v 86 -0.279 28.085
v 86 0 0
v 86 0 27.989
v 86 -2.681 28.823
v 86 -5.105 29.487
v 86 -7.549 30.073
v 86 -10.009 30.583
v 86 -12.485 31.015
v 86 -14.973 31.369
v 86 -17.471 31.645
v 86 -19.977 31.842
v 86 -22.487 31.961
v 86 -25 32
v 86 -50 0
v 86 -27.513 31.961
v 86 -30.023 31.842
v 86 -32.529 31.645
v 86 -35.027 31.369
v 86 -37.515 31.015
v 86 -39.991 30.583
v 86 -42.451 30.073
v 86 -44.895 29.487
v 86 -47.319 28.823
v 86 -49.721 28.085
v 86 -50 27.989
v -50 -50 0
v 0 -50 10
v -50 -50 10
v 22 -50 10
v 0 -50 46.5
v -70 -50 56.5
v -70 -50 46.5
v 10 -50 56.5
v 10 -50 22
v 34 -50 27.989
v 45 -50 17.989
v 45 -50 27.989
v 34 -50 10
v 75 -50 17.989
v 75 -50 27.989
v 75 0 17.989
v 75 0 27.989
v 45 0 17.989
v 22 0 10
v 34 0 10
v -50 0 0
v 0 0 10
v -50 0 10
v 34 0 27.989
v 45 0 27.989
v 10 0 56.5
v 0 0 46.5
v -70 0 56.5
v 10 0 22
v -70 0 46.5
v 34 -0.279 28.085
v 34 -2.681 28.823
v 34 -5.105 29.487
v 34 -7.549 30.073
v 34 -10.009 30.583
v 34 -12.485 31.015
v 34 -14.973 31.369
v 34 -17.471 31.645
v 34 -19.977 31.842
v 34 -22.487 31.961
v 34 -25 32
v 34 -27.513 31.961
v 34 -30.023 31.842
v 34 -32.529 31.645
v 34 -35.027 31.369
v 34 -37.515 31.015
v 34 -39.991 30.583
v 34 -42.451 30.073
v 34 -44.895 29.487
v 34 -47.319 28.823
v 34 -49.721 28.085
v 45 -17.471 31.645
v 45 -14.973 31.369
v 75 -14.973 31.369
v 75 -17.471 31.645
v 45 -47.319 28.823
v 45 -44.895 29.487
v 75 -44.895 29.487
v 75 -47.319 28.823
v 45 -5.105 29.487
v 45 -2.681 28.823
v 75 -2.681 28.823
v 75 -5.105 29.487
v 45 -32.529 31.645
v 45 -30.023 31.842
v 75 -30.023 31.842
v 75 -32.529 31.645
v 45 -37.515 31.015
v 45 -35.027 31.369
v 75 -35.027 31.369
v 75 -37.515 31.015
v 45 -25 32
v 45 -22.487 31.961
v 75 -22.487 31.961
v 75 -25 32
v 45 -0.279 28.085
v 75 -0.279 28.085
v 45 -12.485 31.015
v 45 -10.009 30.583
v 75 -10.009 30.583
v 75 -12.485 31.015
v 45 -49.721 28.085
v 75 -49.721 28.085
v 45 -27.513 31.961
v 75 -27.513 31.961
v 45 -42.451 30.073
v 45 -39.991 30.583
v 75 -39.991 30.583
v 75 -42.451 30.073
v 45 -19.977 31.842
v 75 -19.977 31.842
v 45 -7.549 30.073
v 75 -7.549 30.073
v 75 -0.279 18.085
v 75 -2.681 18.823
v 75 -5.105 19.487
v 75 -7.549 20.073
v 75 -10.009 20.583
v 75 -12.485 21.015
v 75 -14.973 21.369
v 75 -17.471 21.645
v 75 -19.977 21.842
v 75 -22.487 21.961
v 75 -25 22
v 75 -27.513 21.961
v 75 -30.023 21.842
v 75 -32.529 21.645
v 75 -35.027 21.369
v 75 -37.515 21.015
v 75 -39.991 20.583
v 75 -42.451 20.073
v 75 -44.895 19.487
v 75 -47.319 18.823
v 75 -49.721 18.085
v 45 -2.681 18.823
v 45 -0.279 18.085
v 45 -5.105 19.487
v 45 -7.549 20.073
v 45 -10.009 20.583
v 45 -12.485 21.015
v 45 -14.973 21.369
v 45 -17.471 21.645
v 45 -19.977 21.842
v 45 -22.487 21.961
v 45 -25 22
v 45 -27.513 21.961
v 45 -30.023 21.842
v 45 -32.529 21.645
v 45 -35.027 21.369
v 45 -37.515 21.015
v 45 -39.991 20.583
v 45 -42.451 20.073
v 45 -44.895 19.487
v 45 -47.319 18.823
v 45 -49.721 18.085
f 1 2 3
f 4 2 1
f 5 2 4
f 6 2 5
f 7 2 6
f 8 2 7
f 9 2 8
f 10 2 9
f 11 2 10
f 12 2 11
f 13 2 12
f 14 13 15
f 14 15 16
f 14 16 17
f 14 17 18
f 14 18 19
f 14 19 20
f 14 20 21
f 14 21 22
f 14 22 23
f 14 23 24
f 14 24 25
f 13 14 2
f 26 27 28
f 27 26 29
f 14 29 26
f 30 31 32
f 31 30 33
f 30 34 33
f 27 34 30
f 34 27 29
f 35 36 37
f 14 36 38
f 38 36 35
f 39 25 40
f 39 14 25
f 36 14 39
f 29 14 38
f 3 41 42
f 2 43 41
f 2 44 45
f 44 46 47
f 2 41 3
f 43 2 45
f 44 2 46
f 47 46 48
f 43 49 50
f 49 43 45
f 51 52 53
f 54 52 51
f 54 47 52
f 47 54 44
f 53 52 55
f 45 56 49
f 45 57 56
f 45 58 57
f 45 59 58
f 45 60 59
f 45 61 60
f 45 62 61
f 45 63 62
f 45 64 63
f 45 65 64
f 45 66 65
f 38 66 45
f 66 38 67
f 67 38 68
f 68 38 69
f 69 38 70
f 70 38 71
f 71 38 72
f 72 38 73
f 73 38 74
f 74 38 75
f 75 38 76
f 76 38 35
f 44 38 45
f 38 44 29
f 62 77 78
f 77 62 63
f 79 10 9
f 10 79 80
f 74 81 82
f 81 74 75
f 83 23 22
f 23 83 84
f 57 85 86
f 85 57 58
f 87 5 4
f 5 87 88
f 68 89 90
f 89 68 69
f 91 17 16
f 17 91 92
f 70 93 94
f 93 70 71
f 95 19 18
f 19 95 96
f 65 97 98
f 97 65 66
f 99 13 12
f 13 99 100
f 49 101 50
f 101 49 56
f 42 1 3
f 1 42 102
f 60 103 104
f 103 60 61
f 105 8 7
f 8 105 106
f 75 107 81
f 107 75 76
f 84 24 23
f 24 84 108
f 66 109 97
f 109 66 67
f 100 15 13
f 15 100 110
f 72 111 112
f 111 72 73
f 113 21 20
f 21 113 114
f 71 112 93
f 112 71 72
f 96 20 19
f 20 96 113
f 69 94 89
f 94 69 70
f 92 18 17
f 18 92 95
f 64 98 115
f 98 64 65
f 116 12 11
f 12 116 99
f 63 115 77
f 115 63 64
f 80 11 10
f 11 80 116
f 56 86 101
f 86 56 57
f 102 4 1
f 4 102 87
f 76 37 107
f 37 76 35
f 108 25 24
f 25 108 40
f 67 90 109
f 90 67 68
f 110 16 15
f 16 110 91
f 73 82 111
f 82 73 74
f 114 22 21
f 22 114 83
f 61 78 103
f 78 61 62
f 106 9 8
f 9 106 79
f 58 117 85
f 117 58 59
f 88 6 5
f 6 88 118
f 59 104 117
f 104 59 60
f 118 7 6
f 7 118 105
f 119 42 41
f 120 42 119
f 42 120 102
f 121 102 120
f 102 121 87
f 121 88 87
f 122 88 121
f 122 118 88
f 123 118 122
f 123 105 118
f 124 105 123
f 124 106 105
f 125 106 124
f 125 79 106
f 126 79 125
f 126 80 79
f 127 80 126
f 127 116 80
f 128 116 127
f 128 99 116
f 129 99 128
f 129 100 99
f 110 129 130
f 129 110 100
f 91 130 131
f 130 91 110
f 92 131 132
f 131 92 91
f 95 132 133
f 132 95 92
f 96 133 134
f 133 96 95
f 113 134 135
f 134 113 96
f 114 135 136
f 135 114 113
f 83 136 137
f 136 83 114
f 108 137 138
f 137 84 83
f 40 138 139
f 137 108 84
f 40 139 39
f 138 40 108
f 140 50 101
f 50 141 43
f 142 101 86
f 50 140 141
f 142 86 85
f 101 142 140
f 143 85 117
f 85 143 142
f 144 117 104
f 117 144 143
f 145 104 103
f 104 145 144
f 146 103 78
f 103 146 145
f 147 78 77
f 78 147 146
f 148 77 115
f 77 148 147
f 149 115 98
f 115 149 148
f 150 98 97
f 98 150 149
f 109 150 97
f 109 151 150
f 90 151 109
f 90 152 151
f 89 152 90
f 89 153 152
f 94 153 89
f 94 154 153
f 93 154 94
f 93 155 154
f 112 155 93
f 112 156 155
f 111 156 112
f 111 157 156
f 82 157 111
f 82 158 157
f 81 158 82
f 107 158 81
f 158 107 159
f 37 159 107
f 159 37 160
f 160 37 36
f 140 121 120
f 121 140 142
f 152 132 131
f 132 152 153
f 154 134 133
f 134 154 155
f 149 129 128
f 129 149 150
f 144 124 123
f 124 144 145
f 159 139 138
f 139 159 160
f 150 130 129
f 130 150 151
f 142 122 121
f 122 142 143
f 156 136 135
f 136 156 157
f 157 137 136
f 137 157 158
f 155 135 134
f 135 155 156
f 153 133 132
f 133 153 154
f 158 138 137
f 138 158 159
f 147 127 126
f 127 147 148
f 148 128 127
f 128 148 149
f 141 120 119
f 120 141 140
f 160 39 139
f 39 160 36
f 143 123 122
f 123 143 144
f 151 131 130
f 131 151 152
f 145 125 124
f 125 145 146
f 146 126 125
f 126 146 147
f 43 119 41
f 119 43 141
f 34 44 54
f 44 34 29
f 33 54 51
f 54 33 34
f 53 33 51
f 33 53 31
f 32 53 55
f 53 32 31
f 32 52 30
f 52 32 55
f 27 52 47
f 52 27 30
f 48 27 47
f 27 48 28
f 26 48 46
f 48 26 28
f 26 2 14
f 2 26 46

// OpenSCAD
// file: airpods-max-desk-hook.scad
// airpods-max-desk-hook: desk-edge hanger for AirPods Max (384.8 g)
//
// Hooks over a 35mm desktop. Two contoured rails carry the metal headband arms
// so the knit mesh canopy never takes any load - mesh sag is the known failure
// mode on these.
//
// Print it as modelled, lying on its side: the whole C-profile is a vertical
// extrusion, so nothing overhangs and no supports are needed. What reads as
// "up" in use is +Y here; Z is the width along the desk edge.

/* ---- desk ---- */
desk_t       = 35;    // measured desktop thickness
desk_clear   = 1.5;   // slip fit over the edge
top_arm      = 70;    // reach back across the desk top
bot_arm      = 50;    // reach back underneath

/* ---- structure ---- */
arm_t        = 10;    // arm thickness
web_t        = 10;    // web thickness at the desk edge
hook_w       = 50;    // width along the desk edge (= print height)
gusset       = 12;    // 45 deg fillet at the cradle root

/* ---- saddle ---- */
// The hook passes UNDER the headband, so it meets the arch's inner surface:
// the saddle has to be convex for the arch to nest over it. A concave trough
// would touch at a single point and dig in.
cradle_out   = 60;    // saddle centre, measured out from the desk face
cradle_w     = 52;    // total width across both rails
saddle_r     = 80;    // convex radius, matched to the headband arch
saddle_top   = 32;    // height of the saddle crown
block_h      = 34;    // blank the saddle is carved from
relief_w     = 30;    // mesh clearance channel between the rails
relief_d     = 10;    // the knit canopy sags below the metal frame - clear it

eps = 0.01;

slot_h    = desk_t + desk_clear;
top_y0    = arm_t + slot_h;        // underside of the top arm
top_y1    = top_y0 + arm_t;
cradle_x0 = cradle_out - cradle_w / 2;
cradle_x1 = cradle_out + cradle_w / 2;
cz        = hook_w / 2;            // cradle centred across the width

// C-hook and cradle arm, traced as one closed outline.
profile = [
    [-bot_arm,        0],
    [cradle_x1,       0],
    [cradle_x1,       arm_t],
    [web_t + gusset,  arm_t],      // 45 deg gusset into the web
    [web_t,           arm_t + gusset],
    [web_t,           top_y1],
    [-top_arm,        top_y1],
    [-top_arm,        top_y0],
    [0,               top_y0],     // underside of the top arm
    [0,               arm_t],      // back of the desk slot
    [-bot_arm,        arm_t],
];

// A cylinder laid along X: its circular section sits in the YZ plane, which is
// exactly the plane the headband arch curves in.
module arch_cutter(r, cy, x0, len) {
    translate([x0, cy, cz])
        rotate([0, 90, 0])
            cylinder(h = len, r = r, $fn = 200);
}

module saddle_blank() {
    translate([cradle_x0, arm_t, 0])
        cube([cradle_w, block_h - arm_t, hook_w]);
}

module hook() {
    union() {
        linear_extrude(height = hook_w) polygon(profile);

        difference() {
            // Crown the blank into a convex saddle the arch can nest over.
            intersection() {
                saddle_blank();
                arch_cutter(saddle_r, saddle_top - saddle_r,
                            cradle_x0 - eps, cradle_w + 2 * eps);
            }

            // Mesh relief: everything above the same curve dropped by relief_d,
            // limited to the centre band. Leaves two rails carrying the metal
            // frame with the canopy hanging clear between them.
            difference() {
                translate([cradle_out - relief_w / 2, -eps, -eps])
                    cube([relief_w, block_h + 20, hook_w + 2 * eps]);
                arch_cutter(saddle_r, saddle_top - saddle_r - relief_d,
                            cradle_x0 - 2 * eps, cradle_w + 4 * eps);
            }
        }
    }
}

hook();
// main file
// Fit check - NOT for printing. The hook rotated into its in-use orientation
// on a 35mm desk, with a simplified AirPods Max ghosted in to check clearances.
// Real figures: 187.3 x 168.6 x 83.4mm, 384.8 g.

use <airpods-max-desk-hook.scad>

desk_t     = 35;
top_y0     = 46.5;    // underside of the top arm
saddle_top = 32;      // saddle crown
cz         = 25;      // saddle centre across the width
cradle_out = 60;

hp_w       = 168.6;   // ear to ear
arch_ri    = 78;      // headband inner radius - what rests on the saddle
arch_ro    = 90;      // outer radius of the band
cup_d      = 90;
cup_t      = 40;

// Rotate the printed part upright: model +Y becomes world +Z (up).
rotate([90, 0, 0]) hook();

// Desk. Its top face meets the underside of the top arm.
%translate([-150, -130, top_y0 - desk_t]) cube([150, 200, desk_t]);

// Headband arch. Its centre of curvature sits BELOW the band, so the inner
// apex comes down onto the saddle crown - this is the contact the saddle
// was shaped for.
%translate([cradle_out - cup_t / 2, -cz, saddle_top - arch_ri])
    rotate([0, 90, 0])
        linear_extrude(cup_t)
            difference() {
                circle(r = arch_ro, $fn = 160);
                circle(r = arch_ri, $fn = 160);
                translate([0, -arch_ro]) square([arch_ro * 2, arch_ro * 2]);
            }

// Earcups hanging at each end.
for (side = [-1, 1])
    %translate([cradle_out, -cz + side * hp_w / 2 * 0.89, -98])
        rotate([90, 0, 0])
            cylinder(h = cup_t, d = cup_d, center = true, $fn = 64);
